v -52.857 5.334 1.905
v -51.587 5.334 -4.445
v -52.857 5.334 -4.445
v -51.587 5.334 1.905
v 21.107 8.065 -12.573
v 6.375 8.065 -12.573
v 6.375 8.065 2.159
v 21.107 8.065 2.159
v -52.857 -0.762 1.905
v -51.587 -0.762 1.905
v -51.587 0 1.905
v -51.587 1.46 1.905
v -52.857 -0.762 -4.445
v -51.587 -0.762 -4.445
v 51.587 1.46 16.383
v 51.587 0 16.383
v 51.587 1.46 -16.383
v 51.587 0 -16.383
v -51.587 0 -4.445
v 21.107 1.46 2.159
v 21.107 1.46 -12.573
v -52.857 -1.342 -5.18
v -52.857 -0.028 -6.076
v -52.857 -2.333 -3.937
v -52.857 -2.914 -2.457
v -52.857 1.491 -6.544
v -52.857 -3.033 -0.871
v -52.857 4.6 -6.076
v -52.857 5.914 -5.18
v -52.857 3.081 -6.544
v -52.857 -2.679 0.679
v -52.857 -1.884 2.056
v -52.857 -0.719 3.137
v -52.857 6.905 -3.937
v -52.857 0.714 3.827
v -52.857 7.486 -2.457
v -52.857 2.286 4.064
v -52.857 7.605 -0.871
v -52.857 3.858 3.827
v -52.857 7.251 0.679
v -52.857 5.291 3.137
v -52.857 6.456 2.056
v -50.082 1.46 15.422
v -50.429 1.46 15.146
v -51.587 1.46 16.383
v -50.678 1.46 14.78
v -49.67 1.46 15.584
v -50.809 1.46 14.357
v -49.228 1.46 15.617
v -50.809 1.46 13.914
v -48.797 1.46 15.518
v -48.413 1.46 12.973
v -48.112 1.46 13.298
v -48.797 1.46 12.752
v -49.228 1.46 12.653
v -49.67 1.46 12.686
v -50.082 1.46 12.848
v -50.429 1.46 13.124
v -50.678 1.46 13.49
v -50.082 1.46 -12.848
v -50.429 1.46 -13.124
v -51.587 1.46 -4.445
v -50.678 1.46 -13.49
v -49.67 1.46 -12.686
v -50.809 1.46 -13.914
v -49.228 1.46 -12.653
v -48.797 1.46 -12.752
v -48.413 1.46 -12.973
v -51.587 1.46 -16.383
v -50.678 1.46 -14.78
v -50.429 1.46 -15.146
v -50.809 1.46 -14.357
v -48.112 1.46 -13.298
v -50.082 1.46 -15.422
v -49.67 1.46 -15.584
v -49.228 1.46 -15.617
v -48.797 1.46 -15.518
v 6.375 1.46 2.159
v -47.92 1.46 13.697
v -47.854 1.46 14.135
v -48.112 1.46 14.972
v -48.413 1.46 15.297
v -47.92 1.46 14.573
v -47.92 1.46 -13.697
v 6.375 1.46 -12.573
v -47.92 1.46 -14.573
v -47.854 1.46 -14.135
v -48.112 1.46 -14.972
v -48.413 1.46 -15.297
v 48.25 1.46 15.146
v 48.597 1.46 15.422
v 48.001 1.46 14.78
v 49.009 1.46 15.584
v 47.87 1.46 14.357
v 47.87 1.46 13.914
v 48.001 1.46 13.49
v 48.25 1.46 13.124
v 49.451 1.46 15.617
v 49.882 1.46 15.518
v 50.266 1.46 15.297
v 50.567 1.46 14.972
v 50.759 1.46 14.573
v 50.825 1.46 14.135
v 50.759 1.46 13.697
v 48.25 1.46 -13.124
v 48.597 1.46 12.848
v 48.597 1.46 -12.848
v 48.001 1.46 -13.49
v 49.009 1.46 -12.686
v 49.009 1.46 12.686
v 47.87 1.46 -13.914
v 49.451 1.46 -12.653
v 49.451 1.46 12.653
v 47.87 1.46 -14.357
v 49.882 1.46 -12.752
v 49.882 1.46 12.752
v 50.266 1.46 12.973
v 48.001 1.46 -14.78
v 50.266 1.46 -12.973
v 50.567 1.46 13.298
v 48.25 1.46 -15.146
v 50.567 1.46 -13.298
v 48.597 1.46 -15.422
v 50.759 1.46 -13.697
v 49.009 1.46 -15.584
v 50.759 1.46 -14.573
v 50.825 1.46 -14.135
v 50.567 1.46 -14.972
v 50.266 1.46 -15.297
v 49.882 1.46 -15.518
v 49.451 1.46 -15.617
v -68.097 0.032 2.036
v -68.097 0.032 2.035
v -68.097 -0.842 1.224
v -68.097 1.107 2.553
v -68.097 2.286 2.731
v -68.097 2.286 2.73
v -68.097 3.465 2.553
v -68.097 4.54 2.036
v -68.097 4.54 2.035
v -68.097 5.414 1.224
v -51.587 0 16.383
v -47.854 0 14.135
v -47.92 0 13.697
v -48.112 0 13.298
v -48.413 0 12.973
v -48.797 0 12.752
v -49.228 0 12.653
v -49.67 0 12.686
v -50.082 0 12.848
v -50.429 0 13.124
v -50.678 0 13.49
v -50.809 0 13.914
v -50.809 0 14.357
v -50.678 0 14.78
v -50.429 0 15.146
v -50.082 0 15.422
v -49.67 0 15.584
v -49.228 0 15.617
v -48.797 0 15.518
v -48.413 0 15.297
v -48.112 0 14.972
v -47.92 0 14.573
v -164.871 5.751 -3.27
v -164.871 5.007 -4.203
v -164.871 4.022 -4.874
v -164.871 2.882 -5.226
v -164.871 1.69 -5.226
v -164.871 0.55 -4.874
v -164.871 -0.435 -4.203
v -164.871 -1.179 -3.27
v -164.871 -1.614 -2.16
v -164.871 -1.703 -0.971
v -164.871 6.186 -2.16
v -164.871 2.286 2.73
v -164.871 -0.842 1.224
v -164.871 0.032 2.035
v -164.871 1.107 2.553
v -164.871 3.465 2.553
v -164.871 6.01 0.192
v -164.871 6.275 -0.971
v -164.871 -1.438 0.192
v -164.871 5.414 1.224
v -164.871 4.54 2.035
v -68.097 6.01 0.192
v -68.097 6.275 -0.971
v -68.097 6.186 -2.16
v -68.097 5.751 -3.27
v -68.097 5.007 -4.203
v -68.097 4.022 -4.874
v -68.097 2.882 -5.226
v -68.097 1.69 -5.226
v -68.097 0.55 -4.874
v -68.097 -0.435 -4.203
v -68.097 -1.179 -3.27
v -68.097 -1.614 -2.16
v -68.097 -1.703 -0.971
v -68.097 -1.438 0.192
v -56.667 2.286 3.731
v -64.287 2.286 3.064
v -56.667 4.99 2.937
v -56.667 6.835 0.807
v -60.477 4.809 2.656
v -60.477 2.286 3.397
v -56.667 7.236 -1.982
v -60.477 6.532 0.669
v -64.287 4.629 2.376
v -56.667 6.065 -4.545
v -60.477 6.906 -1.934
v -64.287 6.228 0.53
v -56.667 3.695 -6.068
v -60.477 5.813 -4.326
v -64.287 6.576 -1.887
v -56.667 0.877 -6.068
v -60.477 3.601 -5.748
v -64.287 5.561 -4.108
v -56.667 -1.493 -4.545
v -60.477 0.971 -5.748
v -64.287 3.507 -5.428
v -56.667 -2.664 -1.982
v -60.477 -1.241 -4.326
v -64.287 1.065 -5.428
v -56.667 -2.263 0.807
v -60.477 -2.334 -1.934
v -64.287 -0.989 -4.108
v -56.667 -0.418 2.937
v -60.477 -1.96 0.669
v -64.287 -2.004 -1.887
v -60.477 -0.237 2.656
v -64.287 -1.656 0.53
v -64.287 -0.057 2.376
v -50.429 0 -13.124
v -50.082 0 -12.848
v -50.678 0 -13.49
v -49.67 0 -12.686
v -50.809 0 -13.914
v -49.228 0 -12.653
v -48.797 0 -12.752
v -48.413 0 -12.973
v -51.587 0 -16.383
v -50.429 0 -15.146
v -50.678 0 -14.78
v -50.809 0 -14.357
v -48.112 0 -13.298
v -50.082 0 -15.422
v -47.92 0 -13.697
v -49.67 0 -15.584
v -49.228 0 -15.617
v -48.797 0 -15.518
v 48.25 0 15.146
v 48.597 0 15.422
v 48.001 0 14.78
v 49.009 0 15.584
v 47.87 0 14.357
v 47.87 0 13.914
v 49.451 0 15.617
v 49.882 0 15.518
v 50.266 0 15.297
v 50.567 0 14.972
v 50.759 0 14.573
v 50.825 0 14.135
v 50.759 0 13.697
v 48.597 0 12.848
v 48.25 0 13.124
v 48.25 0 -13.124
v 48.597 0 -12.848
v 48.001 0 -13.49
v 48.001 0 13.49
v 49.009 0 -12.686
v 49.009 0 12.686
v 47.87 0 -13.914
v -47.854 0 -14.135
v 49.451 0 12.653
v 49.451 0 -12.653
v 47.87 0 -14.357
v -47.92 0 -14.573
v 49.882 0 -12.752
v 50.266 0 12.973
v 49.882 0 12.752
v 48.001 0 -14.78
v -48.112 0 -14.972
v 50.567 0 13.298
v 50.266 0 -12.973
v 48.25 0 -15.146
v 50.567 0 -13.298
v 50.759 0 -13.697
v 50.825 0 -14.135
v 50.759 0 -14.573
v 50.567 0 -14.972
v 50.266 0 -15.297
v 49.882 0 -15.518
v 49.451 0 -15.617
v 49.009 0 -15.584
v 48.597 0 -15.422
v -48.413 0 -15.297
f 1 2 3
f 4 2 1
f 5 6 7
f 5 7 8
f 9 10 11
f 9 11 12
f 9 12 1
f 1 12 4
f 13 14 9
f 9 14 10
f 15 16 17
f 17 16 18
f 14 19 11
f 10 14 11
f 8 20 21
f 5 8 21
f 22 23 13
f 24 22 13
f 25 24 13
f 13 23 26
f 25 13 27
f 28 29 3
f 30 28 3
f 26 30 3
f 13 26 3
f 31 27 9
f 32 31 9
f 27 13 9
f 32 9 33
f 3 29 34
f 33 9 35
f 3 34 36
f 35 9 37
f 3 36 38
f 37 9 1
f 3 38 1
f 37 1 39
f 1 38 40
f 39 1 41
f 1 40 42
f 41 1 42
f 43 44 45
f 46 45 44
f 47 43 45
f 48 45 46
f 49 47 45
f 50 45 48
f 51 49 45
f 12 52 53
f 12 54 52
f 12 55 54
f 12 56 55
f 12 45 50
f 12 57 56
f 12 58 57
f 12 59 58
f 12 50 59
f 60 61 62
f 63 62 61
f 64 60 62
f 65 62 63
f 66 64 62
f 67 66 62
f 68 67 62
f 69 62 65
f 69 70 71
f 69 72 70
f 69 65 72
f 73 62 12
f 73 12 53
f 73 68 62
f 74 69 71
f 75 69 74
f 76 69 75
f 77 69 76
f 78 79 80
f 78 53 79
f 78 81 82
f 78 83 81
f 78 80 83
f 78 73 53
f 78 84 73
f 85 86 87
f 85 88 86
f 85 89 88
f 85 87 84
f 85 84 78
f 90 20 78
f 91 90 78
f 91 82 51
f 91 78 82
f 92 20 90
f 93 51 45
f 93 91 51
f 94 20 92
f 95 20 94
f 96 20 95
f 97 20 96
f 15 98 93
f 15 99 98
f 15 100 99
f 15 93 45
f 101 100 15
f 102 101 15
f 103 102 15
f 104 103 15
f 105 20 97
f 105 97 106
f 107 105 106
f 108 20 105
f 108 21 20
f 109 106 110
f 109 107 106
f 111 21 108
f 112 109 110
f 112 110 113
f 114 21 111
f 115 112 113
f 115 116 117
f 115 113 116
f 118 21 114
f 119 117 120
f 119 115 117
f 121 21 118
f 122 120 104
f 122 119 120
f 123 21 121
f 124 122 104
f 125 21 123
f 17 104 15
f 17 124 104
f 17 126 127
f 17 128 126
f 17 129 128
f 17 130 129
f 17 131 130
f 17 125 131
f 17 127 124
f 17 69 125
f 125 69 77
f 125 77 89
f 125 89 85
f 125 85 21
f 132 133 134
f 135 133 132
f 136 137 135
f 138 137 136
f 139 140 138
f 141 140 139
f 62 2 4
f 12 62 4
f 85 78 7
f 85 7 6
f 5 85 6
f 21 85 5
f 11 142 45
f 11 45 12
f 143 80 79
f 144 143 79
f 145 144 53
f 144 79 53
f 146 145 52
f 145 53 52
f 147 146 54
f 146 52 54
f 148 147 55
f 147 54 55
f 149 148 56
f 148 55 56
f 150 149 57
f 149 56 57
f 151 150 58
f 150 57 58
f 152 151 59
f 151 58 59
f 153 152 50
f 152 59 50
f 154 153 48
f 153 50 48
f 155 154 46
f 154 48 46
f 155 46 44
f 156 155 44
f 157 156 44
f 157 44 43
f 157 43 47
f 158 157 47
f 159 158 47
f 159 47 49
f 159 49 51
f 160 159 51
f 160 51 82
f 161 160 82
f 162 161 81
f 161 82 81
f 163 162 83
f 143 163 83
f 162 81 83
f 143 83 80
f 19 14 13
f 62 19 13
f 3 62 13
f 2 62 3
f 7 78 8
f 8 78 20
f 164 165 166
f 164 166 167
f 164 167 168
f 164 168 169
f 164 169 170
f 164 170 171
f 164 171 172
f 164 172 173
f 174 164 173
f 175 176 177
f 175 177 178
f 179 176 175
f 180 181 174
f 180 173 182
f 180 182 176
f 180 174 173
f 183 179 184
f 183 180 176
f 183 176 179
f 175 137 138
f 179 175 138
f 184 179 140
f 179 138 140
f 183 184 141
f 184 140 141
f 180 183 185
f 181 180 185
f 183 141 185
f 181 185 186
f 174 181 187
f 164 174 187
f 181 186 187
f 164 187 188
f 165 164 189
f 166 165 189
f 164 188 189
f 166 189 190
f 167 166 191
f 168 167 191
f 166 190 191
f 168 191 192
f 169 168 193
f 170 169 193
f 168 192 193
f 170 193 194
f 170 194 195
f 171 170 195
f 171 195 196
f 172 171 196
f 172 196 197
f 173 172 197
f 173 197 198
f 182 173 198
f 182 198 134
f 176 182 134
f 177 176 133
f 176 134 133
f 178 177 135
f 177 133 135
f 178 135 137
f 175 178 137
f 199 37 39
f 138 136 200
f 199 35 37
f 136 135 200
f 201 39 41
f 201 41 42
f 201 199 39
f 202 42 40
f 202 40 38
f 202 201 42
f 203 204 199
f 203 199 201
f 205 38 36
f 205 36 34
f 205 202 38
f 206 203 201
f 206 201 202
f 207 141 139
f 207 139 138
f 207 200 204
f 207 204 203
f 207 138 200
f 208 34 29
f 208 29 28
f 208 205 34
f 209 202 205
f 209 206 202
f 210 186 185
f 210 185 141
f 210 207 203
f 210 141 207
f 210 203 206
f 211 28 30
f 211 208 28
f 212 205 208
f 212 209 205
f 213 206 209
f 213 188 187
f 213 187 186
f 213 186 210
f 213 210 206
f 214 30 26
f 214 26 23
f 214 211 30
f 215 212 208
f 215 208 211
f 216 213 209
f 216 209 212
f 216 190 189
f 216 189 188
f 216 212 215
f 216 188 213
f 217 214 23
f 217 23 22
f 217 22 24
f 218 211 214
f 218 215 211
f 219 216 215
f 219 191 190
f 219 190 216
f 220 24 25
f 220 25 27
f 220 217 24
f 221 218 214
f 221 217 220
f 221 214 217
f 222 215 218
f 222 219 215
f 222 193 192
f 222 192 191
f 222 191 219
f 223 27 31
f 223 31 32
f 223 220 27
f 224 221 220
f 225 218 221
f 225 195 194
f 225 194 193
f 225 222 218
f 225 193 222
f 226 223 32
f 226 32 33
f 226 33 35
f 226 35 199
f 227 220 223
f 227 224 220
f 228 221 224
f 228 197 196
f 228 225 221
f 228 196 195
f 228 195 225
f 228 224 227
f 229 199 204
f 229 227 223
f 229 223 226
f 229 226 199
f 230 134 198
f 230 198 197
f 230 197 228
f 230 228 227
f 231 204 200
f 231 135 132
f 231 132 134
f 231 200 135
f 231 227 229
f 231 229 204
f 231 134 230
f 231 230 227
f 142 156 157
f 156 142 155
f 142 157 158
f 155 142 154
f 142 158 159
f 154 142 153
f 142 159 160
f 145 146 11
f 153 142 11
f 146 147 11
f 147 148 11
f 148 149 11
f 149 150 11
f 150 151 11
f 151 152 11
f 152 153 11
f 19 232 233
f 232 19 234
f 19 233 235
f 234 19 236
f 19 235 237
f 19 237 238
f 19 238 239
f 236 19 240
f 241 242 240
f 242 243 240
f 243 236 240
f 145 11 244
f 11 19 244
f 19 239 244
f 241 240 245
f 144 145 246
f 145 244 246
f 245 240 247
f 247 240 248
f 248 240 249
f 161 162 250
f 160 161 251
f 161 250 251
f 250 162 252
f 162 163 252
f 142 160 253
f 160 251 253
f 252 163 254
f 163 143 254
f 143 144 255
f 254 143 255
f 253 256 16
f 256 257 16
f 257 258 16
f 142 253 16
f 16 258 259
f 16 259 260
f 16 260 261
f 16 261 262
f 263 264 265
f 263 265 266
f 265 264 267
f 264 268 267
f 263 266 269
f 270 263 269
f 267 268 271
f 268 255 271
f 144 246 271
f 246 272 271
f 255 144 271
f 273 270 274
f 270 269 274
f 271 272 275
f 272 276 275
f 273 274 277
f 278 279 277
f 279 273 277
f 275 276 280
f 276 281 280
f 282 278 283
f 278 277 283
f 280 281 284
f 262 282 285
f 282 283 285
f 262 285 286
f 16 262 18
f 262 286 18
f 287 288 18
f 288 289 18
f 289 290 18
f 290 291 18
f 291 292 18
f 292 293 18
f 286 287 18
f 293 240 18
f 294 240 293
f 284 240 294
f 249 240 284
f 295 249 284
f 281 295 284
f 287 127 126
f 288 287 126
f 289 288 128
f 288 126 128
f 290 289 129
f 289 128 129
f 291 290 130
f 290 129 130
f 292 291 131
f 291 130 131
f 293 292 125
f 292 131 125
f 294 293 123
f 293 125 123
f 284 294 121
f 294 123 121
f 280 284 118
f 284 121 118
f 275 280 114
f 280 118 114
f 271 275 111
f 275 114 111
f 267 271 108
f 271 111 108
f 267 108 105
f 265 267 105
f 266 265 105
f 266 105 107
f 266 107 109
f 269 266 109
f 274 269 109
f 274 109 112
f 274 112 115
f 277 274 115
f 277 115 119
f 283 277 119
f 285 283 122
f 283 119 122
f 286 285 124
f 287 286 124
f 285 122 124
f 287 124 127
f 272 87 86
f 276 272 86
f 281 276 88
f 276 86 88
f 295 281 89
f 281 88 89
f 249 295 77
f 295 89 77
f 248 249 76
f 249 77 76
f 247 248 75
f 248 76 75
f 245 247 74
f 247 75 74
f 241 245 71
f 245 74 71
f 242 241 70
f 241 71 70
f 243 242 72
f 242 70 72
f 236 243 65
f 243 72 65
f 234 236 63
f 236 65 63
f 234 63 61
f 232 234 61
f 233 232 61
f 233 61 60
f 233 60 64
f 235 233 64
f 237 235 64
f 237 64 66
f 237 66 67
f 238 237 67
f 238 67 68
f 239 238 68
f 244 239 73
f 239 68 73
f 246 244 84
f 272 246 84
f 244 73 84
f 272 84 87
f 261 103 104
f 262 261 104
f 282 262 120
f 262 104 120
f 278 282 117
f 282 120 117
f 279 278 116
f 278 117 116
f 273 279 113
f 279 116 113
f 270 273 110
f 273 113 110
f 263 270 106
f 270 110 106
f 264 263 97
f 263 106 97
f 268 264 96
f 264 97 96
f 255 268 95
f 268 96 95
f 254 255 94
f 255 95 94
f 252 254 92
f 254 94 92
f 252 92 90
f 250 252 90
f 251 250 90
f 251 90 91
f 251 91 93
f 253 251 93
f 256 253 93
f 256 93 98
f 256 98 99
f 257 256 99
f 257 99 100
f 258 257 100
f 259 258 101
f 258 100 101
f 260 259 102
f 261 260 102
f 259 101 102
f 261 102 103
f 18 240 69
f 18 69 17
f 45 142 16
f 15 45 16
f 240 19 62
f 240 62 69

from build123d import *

# Parameters (mm, degrees)
SKETCH1_W             = 103.1748
SKETCH1_H             = 32.766
TRS_PCB_DEPTH         = 1.4605
SKETCH2_R             = 1.4859
STAND_OFF_HOLES_DEPTH = 1.4605
SKETCH3_W             = 14.732
SKETCH3_H             = 14.732
GPS_ANTENNA_DEPTH     = 6.604
SKETCH4_W             = 6.35
SKETCH4_H             = 6.096
BOSS_EXTRUDE2_DEPTH   = 1.27
SKETCH5_R             = 5.334
BOSS_EXTRUDE3_DEPTH   = 15.24
BOSS_EXTRUDE3_TAPER   = 5
SKETCH6_R             = 4.0005
BOSS_EXTRUDE4_DEPTH   = 96.774


with BuildPart() as part:
    # Sketch1 → TRS PCB (new body)
    with BuildSketch(Plane(origin=(0, 0, 0), x_dir=(1, 0, 0), z_dir=(0, 1, 0))):
        Rectangle(SKETCH1_W, SKETCH1_H)
    extrude(amount=TRS_PCB_DEPTH)

    # Sketch2 → Stand off holes (cut)
    with BuildSketch(Plane(origin=(0, 1.4605, 0), x_dir=(1, 0, 0), z_dir=(0, 1, 0))):
        with Locations((-49.3395, 14.1351)):
            Circle(SKETCH2_R)
        with Locations((49.3395, 14.1351)):
            Circle(SKETCH2_R)
        with Locations((49.3395, -14.1351)):
            Circle(SKETCH2_R)
        with Locations((-49.3395, -14.1351)):
            Circle(SKETCH2_R)
    extrude(amount=-STAND_OFF_HOLES_DEPTH, mode=Mode.SUBTRACT)

    # Sketch3 → GPS Antenna (add)
    with BuildSketch(Plane(origin=(0, 1.4605, 0), x_dir=(1, 0, 0), z_dir=(0, 1, 0))):
        with Locations((13.7414, 5.207)):
            Rectangle(SKETCH3_W, SKETCH3_H)
    extrude(amount=GPS_ANTENNA_DEPTH)

    # Sketch4 → Boss-Extrude2 (add)
    with BuildSketch(Plane.ZY.offset(51.5874)):
        with Locations((-1.27, 2.286)):
            Rectangle(SKETCH4_W, SKETCH4_H)
    extrude(amount=BOSS_EXTRUDE2_DEPTH)

    # Sketch5 → Boss-Extrude3 (add)
    with BuildSketch(Plane.ZY.offset(52.8574)):
        with Locations((-1.27, 2.286)):
            Circle(SKETCH5_R)
    extrude(amount=BOSS_EXTRUDE3_DEPTH, taper=BOSS_EXTRUDE3_TAPER)

    # Sketch6 → Boss-Extrude4 (add)
    with BuildSketch(Plane.ZY.offset(68.0974)):
        with Locations((-1.27, 2.286)):
            Circle(SKETCH6_R)
    extrude(amount=BOSS_EXTRUDE4_DEPTH)


solid = part.part
